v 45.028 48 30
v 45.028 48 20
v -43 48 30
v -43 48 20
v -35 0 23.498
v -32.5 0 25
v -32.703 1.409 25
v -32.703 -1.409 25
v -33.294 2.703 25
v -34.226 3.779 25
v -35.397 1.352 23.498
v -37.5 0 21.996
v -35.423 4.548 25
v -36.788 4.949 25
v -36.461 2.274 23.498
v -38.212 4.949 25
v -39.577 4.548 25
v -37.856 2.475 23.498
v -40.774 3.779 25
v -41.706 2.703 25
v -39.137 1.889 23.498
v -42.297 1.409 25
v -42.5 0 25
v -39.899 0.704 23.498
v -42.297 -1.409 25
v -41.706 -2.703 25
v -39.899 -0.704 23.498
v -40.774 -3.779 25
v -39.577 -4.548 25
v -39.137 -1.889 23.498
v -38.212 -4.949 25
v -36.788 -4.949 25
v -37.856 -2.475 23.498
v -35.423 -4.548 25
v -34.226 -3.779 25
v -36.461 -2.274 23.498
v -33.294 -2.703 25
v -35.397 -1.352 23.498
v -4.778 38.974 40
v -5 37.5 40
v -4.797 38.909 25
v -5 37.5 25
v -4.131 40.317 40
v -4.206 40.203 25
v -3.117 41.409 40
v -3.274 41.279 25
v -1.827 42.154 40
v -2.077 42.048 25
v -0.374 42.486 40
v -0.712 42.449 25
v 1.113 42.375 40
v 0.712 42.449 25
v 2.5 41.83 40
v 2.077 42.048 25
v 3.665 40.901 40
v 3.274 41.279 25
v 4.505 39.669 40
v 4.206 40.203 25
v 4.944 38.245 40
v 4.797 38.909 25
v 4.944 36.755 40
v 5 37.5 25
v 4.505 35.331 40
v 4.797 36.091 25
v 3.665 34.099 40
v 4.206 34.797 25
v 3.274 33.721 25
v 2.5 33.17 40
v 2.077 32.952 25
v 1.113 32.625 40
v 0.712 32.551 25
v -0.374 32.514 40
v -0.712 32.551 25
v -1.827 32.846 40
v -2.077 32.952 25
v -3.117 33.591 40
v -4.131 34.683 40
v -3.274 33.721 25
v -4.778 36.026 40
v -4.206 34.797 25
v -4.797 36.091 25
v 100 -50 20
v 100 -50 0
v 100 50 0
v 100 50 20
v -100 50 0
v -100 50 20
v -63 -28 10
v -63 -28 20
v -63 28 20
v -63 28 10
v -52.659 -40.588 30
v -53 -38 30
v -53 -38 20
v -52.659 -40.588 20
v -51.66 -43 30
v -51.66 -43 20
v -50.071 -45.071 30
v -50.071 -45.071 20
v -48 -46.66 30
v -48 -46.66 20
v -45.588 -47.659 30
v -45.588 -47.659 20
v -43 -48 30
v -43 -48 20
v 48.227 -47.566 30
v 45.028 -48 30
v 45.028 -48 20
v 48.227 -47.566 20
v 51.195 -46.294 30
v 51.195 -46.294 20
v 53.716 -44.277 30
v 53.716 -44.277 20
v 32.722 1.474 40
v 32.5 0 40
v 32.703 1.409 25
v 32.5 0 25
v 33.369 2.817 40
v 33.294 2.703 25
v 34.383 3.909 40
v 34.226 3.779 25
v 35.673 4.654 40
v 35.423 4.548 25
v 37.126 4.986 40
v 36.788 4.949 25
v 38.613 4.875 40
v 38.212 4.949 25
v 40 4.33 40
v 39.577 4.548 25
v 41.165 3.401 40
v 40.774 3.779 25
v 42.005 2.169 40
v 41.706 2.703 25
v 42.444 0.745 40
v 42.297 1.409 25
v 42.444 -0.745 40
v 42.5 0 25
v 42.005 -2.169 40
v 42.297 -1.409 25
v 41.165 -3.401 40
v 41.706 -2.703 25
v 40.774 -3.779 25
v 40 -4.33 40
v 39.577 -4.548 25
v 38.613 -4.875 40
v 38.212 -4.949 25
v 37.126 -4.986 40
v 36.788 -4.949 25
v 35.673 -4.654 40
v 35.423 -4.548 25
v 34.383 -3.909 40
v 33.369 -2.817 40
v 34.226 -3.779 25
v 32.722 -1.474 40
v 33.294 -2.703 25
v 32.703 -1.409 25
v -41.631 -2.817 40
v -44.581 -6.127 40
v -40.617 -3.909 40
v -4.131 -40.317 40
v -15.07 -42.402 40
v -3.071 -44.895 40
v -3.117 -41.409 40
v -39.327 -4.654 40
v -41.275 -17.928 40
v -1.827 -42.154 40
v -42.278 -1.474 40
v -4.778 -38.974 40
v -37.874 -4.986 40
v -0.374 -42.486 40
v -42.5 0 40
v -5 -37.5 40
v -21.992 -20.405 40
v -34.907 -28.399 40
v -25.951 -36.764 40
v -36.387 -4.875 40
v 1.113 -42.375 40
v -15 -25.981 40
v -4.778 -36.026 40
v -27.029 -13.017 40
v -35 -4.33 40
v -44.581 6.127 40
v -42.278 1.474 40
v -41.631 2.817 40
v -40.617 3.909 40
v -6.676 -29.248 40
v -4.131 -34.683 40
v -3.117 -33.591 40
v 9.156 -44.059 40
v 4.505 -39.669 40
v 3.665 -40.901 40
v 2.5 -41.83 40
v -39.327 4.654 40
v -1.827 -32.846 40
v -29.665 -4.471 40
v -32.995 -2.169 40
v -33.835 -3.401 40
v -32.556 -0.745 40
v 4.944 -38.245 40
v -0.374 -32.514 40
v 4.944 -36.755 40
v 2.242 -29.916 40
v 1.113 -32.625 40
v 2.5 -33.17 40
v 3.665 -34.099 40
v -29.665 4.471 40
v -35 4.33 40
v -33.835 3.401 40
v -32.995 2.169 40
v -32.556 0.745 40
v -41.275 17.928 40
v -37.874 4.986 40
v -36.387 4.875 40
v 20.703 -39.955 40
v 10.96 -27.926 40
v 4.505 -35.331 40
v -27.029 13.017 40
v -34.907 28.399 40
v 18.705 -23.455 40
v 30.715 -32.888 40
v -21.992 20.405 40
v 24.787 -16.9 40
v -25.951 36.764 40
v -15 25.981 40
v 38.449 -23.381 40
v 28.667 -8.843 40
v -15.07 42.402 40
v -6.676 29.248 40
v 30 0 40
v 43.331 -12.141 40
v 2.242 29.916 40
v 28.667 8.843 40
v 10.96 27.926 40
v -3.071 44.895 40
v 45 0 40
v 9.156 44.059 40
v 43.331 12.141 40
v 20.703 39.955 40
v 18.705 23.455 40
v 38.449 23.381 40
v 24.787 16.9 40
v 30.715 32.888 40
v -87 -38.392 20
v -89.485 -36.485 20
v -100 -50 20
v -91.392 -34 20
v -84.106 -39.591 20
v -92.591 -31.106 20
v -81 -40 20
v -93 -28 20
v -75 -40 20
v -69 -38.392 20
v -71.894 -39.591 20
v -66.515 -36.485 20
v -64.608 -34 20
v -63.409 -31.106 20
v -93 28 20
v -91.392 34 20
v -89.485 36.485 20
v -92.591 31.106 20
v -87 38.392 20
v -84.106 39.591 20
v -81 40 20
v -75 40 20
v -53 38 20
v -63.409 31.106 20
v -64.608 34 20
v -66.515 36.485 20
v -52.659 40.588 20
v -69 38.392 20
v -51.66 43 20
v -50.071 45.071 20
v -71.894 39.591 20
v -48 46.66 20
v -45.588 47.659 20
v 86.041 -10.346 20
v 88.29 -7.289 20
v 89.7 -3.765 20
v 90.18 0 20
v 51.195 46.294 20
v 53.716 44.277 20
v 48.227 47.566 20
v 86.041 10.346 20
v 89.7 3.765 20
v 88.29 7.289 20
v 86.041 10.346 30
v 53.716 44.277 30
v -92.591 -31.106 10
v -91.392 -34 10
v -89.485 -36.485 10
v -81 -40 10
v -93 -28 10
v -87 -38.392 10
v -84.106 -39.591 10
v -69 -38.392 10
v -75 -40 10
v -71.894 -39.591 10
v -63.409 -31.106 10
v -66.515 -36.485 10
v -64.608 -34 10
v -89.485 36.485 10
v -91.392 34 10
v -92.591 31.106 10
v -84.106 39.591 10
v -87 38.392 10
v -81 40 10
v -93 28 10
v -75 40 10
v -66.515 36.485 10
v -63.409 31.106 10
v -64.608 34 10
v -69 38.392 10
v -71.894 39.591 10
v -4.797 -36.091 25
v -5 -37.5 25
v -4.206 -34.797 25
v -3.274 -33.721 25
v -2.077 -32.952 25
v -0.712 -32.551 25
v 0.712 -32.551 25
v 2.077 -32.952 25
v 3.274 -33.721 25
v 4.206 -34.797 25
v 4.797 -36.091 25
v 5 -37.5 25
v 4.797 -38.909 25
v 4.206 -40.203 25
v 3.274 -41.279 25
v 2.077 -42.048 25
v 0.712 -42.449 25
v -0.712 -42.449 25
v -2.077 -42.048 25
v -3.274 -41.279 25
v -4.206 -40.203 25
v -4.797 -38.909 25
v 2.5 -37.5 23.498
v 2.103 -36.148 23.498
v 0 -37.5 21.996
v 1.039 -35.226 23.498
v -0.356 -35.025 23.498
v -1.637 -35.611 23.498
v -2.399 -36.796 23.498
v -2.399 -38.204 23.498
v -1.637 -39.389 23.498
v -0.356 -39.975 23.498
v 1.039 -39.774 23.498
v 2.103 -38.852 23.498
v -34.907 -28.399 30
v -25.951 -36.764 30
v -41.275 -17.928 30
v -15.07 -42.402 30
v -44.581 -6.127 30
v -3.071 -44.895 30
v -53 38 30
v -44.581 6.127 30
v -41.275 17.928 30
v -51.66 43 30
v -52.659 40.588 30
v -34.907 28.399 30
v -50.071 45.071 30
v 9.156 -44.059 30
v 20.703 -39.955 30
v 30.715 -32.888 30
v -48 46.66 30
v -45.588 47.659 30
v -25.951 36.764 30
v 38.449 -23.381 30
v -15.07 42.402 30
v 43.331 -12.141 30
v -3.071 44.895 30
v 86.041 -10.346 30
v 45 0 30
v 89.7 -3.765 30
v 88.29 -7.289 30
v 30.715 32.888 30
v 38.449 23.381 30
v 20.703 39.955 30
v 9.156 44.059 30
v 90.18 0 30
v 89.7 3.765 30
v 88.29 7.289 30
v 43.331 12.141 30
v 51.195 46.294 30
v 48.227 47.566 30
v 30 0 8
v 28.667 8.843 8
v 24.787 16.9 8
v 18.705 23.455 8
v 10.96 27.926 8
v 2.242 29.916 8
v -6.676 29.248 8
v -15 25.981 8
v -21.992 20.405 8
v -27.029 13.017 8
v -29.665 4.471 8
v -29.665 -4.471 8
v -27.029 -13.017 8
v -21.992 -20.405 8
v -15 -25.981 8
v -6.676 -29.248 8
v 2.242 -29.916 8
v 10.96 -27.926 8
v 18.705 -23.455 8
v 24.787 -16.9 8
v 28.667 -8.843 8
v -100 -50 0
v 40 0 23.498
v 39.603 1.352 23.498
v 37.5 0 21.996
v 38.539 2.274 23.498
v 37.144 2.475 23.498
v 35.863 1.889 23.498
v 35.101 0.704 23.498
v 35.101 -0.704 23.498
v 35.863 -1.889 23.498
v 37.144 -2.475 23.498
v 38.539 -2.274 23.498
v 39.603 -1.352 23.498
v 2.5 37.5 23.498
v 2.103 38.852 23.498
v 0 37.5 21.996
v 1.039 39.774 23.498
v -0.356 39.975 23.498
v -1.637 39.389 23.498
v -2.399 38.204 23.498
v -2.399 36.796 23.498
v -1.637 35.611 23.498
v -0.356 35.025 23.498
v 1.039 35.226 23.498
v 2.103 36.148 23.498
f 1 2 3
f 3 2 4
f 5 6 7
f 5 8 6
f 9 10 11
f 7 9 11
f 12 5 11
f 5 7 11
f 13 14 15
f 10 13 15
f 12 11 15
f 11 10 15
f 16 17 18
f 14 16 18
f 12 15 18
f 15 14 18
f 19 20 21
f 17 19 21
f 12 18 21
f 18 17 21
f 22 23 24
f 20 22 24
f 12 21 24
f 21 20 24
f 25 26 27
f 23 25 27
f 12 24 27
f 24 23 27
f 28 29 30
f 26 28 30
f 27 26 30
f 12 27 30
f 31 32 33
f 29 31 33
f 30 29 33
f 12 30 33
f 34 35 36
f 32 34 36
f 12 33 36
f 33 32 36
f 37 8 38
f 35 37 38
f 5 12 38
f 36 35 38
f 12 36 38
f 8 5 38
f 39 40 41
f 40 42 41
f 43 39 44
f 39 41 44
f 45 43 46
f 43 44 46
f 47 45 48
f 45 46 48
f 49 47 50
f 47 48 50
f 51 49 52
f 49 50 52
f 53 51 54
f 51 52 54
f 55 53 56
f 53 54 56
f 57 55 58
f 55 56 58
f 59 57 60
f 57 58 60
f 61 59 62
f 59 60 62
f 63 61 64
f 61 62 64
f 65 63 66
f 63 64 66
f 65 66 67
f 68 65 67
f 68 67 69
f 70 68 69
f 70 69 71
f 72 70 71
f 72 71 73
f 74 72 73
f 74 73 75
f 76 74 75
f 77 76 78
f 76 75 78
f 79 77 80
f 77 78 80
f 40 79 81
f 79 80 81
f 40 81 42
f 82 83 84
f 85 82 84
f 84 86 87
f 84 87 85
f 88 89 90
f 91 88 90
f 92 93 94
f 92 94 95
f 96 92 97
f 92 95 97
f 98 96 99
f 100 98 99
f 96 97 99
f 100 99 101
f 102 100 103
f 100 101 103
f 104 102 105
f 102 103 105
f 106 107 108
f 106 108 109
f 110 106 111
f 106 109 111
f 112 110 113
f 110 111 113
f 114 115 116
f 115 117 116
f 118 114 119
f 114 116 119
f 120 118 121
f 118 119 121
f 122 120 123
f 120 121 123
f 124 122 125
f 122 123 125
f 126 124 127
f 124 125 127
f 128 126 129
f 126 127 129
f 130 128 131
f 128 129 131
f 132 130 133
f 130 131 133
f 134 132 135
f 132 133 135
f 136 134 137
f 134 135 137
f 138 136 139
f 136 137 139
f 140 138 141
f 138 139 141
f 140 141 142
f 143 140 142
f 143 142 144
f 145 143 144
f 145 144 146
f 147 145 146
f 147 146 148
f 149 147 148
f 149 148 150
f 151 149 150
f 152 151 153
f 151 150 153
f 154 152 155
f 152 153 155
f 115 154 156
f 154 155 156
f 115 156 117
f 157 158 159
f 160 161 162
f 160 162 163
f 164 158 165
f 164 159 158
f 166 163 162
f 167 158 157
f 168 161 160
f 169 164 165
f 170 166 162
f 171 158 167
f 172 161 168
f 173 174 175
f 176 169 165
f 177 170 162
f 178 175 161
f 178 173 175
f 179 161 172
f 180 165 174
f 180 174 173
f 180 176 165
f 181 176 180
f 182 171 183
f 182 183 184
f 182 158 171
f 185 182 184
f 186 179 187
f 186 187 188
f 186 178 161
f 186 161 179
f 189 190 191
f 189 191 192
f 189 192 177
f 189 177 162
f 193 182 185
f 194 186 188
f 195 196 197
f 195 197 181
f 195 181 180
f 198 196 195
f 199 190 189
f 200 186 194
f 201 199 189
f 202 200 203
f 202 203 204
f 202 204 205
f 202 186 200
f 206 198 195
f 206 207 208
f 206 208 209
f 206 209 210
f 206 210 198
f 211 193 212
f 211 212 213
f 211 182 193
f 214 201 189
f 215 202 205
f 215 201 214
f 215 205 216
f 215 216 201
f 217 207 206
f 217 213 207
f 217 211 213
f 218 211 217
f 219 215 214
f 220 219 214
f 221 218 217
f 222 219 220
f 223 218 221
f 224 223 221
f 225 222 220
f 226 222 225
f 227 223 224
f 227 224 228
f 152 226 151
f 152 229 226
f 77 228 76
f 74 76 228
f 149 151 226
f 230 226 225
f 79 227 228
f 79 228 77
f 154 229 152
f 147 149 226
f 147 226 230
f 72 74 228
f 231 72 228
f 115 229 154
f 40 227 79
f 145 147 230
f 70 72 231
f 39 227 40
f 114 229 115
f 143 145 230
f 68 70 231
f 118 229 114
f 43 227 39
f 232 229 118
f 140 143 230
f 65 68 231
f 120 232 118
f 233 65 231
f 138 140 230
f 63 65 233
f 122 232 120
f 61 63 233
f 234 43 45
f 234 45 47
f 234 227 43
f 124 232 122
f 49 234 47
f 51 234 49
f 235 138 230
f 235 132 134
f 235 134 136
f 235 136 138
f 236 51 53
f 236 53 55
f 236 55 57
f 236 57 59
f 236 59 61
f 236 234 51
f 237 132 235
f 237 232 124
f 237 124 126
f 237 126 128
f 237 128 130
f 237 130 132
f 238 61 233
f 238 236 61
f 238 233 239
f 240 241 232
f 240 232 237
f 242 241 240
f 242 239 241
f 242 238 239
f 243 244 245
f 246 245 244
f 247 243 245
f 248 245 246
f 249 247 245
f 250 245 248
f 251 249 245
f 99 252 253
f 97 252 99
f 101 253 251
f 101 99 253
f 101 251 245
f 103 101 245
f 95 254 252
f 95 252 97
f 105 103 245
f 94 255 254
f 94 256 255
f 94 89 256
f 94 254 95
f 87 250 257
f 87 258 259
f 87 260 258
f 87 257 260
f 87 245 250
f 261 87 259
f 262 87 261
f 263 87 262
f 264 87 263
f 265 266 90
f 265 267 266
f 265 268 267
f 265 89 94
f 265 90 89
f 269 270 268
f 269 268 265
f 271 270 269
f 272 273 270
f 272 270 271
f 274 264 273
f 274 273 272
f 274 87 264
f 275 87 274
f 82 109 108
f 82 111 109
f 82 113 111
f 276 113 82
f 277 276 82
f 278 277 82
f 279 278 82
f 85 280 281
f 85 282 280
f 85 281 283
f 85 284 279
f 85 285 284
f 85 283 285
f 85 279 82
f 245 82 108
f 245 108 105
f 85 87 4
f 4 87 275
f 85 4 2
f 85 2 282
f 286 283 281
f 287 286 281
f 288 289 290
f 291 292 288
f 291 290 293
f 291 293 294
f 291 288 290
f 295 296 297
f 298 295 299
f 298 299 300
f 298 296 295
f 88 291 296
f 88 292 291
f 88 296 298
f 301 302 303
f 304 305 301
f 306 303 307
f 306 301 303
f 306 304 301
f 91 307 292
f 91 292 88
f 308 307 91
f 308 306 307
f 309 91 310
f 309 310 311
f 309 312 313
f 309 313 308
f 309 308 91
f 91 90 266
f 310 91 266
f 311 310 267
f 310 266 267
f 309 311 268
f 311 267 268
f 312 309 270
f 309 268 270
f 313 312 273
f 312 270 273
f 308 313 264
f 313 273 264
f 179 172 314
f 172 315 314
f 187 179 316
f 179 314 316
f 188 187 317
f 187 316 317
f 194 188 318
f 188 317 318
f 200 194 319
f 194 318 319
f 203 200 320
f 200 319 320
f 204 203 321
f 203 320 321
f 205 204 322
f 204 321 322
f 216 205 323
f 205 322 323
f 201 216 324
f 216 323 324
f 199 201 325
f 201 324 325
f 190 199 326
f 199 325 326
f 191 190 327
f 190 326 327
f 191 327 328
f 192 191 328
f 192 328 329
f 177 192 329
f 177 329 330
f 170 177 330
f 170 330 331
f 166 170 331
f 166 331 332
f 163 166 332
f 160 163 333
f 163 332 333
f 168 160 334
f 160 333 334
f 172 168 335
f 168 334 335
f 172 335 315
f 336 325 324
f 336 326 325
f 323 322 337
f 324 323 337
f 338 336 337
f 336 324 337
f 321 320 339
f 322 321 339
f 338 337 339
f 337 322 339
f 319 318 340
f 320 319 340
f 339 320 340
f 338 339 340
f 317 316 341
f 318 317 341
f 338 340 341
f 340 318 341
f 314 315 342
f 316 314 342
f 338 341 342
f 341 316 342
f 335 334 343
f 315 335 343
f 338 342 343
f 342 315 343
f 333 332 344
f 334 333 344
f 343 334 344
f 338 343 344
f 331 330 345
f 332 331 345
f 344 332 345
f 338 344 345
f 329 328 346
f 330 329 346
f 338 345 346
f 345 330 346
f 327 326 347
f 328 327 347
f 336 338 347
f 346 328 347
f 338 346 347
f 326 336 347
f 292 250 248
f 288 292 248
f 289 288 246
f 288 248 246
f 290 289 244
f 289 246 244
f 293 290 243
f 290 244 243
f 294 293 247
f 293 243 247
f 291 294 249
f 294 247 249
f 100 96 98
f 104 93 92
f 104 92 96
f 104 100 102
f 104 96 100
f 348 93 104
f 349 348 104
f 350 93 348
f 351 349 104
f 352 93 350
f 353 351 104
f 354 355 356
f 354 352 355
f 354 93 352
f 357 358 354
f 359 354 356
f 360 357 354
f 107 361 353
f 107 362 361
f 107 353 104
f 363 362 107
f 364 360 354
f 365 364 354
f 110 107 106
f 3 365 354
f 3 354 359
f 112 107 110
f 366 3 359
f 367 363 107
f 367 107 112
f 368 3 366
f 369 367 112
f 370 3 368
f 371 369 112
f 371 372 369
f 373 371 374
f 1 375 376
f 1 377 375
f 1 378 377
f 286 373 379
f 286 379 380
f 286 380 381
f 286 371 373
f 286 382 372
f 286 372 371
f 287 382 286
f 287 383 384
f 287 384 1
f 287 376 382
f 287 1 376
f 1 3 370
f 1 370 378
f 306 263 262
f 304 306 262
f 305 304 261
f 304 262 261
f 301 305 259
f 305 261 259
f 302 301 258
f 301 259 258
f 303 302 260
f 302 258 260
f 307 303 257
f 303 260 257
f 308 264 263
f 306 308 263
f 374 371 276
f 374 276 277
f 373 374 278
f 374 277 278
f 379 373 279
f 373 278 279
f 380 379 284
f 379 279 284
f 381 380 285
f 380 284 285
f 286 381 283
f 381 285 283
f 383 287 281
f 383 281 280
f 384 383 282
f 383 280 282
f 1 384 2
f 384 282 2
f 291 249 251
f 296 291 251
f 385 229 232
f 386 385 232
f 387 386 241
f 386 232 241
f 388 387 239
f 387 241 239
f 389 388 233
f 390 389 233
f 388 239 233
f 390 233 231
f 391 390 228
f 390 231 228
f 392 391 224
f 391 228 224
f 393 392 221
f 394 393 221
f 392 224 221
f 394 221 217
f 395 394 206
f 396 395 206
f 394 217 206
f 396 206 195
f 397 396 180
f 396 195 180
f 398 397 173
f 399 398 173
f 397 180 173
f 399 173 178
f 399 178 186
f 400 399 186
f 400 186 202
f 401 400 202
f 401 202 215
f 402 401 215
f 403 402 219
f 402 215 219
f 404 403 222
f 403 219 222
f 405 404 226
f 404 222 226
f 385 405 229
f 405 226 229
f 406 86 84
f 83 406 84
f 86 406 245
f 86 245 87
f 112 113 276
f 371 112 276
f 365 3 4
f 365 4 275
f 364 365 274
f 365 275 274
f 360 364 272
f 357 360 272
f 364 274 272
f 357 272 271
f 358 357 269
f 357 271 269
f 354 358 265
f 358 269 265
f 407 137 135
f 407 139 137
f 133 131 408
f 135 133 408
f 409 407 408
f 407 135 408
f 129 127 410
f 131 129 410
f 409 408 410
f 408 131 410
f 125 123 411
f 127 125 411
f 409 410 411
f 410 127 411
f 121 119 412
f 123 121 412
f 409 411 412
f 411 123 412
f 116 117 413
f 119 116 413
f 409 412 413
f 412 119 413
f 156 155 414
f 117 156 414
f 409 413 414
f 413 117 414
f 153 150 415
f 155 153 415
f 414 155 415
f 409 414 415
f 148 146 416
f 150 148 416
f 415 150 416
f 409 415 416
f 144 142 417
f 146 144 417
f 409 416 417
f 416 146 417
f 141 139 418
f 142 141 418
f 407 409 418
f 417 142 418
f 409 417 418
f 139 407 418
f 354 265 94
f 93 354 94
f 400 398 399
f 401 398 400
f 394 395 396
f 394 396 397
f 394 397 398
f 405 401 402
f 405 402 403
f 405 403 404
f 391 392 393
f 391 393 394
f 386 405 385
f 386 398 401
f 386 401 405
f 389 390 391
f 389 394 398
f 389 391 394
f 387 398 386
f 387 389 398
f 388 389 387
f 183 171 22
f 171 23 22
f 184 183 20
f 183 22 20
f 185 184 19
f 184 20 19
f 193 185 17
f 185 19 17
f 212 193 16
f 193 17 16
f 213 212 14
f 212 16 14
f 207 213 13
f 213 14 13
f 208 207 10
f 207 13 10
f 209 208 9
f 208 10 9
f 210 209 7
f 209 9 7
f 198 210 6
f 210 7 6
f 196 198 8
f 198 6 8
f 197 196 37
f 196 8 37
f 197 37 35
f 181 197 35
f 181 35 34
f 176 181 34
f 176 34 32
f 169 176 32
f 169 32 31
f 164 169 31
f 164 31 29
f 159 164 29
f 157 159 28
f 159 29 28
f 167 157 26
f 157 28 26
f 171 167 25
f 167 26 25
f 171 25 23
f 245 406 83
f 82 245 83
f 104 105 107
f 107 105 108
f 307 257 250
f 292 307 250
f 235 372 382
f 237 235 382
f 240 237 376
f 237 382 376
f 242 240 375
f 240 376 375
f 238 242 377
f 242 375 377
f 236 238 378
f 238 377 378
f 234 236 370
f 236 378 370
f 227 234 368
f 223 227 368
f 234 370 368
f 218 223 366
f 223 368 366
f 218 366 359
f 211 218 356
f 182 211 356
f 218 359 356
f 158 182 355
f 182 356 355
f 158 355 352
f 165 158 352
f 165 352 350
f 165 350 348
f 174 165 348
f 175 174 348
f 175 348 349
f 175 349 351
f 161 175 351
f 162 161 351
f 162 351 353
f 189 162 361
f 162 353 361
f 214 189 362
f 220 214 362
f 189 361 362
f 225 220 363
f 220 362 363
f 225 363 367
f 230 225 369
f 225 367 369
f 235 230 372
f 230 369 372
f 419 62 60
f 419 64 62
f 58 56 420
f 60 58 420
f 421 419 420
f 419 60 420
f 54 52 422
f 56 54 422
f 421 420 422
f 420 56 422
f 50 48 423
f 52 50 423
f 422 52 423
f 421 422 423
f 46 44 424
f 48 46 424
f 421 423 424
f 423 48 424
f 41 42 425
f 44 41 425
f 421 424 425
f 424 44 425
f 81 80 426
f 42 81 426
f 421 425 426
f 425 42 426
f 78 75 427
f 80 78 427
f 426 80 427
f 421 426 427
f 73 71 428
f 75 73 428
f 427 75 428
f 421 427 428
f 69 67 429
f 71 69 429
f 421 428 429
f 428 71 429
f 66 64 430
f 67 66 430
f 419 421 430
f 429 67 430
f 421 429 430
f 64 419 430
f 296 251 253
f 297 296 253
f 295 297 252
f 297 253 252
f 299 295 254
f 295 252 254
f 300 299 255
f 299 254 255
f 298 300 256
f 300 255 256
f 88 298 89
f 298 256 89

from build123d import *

# Parameters (mm, degrees)
F0_W      = 200
F0_H      = 100
F1_DEPTH  = 20
F3_DEPTH  = 10
F5_DEPTH  = 10
F6_R      = 45
F7_DEPTH  = 10
F8_R      = 30
F9_DEPTH  = 32
F11_D     = 10
F11_DEPTH = 15
F11_TIP   = 3.0043030951


with BuildPart() as f1:
    # F0 (on Top) → F1 (new body)
    with BuildSketch(Plane.XY):
        Rectangle(F0_W, F0_H)
    extrude(amount=F1_DEPTH)

    # F2 (on face) → F3 (cut)
    with BuildSketch(Plane.XY.offset(20)):
        with BuildLine():
            Line((-75, 40), (-81, 40))
            ThreePointArc((-81, 40), (-89.4852813742, 36.4852813742), (-93, 28))
            Line((-93, 28), (-93, -28))
            ThreePointArc((-93, -28), (-89.4852813742, -36.4852813742), (-81, -40))
            Line((-81, -40), (-75, -40))
            ThreePointArc((-75, -40), (-66.5147186258, -36.4852813742), (-63, -28))
            Line((-63, -28), (-63, 28))
            ThreePointArc((-63, 28), (-66.5147186258, 36.4852813742), (-75, 40))
        make_face()
    extrude(amount=-F3_DEPTH, mode=Mode.SUBTRACT)

    # F4 (on face) → F5 (join)
    with BuildSketch(Plane.XY.offset(20)):
        with BuildLine():
            Line((45.028, 48), (-43, 48))
            ThreePointArc((-43, 48), (-50.0710678119, 45.0710678119), (-53, 38))
            Line((-53, 38), (-53, -38))
            ThreePointArc((-53, -38), (-50.0710678119, -45.0710678119), (-43, -48))
            Line((-43, -48), (45.028, -48))
            ThreePointArc((45.028, -48), (49.7542524478, -47.0300742427), (53.7164858981, -44.2770896333))
            Line((53.7164858981, -44.2770896333), (86.0406073726, -10.3463620417))
            ThreePointArc((86.0406073726, -10.3463620417), (90.18, 0), (86.0406073726, 10.3463620417))
            Line((86.0406073726, 10.3463620417), (53.7164858981, 44.2770896333))
            ThreePointArc((53.7164858981, 44.2770896333), (49.7542524478, 47.0300742427), (45.028, 48))
        make_face()
    extrude(amount=F5_DEPTH)

    # F6 (on face) → F7 (join)
    with BuildSketch(Plane.XY.offset(30)):
        Circle(F6_R)
    extrude(amount=F7_DEPTH)

    # F8 (on face) → F9 (cut)
    with BuildSketch(Plane.XY.offset(40)):
        Circle(F8_R)
    extrude(amount=-F9_DEPTH, mode=Mode.SUBTRACT)

    # F11
    with Locations(Plane.XY.offset(40)):
        with Locations((-37.5, 0), (0, 37.5), (37.5, 0), (0, -37.5)):
            Hole(F11_D / 2, depth=F11_DEPTH)
            with Locations((0, 0, -(F11_DEPTH + F11_TIP / 2))):  # 118° drill point
                Cone(0, F11_D / 2, F11_TIP, mode=Mode.SUBTRACT)


solid = f1.part
